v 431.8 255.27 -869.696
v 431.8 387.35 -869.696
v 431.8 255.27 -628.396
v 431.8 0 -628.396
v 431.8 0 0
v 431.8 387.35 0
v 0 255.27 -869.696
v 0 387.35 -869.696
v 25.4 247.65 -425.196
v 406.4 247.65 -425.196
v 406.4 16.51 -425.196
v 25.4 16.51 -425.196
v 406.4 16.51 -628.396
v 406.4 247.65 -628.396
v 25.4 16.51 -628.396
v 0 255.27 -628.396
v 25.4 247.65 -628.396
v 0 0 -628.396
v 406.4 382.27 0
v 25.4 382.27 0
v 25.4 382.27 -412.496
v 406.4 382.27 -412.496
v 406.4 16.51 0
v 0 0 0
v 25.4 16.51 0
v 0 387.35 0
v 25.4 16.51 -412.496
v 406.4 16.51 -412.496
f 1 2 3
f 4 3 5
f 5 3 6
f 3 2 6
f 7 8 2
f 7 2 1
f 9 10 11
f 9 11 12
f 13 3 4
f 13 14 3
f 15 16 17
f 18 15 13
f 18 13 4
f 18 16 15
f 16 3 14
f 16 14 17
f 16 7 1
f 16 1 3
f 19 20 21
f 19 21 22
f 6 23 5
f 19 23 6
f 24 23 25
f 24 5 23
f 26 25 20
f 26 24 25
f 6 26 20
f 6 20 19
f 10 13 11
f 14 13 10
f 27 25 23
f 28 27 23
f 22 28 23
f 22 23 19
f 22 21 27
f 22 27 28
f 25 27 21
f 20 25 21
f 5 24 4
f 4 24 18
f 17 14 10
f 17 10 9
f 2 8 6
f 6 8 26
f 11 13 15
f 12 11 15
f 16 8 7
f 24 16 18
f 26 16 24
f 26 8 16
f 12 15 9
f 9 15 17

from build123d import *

# Parameters (mm, degrees)
BOSS_EXTRUDE1_DEPTH = 431.8
SKETCH2_W           = 381
SKETCH2_H           = 231.14
CUT_EXTRUDE1_DEPTH  = 203.2
SKETCH3_W           = 381
SKETCH3_H           = 365.76
CUT_EXTRUDE2_DEPTH  = 412.496


with BuildPart() as part:
    # Sketch1 → Boss-Extrude1 (new body)
    with BuildSketch(Plane(origin=(0, 0, 0), x_dir=(0, 0, -1), z_dir=(1, 0, 0))):
        Polygon((412.496, 387.35), (869.696, 387.35), (869.696, 255.27), (628.396, 255.27), (628.396, 0), (412.496, 0), (0, 0), (0, 387.35), align=None)
    extrude(amount=BOSS_EXTRUDE1_DEPTH)

    # Sketch2 → Cut-Extrude1 (cut)
    with BuildSketch(Plane(origin=(0, 0, -628.396), x_dir=(-1, 0, 0), z_dir=(0, 0, -1))):
        with Locations((-215.9, 132.08)):
            Rectangle(SKETCH2_W, SKETCH2_H)
    extrude(amount=-CUT_EXTRUDE1_DEPTH, mode=Mode.SUBTRACT)

    # Sketch3 → Cut-Extrude2 (cut)
    with BuildSketch(Plane.XY):
        with Locations((215.9, 199.39)):
            Rectangle(SKETCH3_W, SKETCH3_H)
    extrude(amount=-CUT_EXTRUDE2_DEPTH, mode=Mode.SUBTRACT)


solid = part.part
